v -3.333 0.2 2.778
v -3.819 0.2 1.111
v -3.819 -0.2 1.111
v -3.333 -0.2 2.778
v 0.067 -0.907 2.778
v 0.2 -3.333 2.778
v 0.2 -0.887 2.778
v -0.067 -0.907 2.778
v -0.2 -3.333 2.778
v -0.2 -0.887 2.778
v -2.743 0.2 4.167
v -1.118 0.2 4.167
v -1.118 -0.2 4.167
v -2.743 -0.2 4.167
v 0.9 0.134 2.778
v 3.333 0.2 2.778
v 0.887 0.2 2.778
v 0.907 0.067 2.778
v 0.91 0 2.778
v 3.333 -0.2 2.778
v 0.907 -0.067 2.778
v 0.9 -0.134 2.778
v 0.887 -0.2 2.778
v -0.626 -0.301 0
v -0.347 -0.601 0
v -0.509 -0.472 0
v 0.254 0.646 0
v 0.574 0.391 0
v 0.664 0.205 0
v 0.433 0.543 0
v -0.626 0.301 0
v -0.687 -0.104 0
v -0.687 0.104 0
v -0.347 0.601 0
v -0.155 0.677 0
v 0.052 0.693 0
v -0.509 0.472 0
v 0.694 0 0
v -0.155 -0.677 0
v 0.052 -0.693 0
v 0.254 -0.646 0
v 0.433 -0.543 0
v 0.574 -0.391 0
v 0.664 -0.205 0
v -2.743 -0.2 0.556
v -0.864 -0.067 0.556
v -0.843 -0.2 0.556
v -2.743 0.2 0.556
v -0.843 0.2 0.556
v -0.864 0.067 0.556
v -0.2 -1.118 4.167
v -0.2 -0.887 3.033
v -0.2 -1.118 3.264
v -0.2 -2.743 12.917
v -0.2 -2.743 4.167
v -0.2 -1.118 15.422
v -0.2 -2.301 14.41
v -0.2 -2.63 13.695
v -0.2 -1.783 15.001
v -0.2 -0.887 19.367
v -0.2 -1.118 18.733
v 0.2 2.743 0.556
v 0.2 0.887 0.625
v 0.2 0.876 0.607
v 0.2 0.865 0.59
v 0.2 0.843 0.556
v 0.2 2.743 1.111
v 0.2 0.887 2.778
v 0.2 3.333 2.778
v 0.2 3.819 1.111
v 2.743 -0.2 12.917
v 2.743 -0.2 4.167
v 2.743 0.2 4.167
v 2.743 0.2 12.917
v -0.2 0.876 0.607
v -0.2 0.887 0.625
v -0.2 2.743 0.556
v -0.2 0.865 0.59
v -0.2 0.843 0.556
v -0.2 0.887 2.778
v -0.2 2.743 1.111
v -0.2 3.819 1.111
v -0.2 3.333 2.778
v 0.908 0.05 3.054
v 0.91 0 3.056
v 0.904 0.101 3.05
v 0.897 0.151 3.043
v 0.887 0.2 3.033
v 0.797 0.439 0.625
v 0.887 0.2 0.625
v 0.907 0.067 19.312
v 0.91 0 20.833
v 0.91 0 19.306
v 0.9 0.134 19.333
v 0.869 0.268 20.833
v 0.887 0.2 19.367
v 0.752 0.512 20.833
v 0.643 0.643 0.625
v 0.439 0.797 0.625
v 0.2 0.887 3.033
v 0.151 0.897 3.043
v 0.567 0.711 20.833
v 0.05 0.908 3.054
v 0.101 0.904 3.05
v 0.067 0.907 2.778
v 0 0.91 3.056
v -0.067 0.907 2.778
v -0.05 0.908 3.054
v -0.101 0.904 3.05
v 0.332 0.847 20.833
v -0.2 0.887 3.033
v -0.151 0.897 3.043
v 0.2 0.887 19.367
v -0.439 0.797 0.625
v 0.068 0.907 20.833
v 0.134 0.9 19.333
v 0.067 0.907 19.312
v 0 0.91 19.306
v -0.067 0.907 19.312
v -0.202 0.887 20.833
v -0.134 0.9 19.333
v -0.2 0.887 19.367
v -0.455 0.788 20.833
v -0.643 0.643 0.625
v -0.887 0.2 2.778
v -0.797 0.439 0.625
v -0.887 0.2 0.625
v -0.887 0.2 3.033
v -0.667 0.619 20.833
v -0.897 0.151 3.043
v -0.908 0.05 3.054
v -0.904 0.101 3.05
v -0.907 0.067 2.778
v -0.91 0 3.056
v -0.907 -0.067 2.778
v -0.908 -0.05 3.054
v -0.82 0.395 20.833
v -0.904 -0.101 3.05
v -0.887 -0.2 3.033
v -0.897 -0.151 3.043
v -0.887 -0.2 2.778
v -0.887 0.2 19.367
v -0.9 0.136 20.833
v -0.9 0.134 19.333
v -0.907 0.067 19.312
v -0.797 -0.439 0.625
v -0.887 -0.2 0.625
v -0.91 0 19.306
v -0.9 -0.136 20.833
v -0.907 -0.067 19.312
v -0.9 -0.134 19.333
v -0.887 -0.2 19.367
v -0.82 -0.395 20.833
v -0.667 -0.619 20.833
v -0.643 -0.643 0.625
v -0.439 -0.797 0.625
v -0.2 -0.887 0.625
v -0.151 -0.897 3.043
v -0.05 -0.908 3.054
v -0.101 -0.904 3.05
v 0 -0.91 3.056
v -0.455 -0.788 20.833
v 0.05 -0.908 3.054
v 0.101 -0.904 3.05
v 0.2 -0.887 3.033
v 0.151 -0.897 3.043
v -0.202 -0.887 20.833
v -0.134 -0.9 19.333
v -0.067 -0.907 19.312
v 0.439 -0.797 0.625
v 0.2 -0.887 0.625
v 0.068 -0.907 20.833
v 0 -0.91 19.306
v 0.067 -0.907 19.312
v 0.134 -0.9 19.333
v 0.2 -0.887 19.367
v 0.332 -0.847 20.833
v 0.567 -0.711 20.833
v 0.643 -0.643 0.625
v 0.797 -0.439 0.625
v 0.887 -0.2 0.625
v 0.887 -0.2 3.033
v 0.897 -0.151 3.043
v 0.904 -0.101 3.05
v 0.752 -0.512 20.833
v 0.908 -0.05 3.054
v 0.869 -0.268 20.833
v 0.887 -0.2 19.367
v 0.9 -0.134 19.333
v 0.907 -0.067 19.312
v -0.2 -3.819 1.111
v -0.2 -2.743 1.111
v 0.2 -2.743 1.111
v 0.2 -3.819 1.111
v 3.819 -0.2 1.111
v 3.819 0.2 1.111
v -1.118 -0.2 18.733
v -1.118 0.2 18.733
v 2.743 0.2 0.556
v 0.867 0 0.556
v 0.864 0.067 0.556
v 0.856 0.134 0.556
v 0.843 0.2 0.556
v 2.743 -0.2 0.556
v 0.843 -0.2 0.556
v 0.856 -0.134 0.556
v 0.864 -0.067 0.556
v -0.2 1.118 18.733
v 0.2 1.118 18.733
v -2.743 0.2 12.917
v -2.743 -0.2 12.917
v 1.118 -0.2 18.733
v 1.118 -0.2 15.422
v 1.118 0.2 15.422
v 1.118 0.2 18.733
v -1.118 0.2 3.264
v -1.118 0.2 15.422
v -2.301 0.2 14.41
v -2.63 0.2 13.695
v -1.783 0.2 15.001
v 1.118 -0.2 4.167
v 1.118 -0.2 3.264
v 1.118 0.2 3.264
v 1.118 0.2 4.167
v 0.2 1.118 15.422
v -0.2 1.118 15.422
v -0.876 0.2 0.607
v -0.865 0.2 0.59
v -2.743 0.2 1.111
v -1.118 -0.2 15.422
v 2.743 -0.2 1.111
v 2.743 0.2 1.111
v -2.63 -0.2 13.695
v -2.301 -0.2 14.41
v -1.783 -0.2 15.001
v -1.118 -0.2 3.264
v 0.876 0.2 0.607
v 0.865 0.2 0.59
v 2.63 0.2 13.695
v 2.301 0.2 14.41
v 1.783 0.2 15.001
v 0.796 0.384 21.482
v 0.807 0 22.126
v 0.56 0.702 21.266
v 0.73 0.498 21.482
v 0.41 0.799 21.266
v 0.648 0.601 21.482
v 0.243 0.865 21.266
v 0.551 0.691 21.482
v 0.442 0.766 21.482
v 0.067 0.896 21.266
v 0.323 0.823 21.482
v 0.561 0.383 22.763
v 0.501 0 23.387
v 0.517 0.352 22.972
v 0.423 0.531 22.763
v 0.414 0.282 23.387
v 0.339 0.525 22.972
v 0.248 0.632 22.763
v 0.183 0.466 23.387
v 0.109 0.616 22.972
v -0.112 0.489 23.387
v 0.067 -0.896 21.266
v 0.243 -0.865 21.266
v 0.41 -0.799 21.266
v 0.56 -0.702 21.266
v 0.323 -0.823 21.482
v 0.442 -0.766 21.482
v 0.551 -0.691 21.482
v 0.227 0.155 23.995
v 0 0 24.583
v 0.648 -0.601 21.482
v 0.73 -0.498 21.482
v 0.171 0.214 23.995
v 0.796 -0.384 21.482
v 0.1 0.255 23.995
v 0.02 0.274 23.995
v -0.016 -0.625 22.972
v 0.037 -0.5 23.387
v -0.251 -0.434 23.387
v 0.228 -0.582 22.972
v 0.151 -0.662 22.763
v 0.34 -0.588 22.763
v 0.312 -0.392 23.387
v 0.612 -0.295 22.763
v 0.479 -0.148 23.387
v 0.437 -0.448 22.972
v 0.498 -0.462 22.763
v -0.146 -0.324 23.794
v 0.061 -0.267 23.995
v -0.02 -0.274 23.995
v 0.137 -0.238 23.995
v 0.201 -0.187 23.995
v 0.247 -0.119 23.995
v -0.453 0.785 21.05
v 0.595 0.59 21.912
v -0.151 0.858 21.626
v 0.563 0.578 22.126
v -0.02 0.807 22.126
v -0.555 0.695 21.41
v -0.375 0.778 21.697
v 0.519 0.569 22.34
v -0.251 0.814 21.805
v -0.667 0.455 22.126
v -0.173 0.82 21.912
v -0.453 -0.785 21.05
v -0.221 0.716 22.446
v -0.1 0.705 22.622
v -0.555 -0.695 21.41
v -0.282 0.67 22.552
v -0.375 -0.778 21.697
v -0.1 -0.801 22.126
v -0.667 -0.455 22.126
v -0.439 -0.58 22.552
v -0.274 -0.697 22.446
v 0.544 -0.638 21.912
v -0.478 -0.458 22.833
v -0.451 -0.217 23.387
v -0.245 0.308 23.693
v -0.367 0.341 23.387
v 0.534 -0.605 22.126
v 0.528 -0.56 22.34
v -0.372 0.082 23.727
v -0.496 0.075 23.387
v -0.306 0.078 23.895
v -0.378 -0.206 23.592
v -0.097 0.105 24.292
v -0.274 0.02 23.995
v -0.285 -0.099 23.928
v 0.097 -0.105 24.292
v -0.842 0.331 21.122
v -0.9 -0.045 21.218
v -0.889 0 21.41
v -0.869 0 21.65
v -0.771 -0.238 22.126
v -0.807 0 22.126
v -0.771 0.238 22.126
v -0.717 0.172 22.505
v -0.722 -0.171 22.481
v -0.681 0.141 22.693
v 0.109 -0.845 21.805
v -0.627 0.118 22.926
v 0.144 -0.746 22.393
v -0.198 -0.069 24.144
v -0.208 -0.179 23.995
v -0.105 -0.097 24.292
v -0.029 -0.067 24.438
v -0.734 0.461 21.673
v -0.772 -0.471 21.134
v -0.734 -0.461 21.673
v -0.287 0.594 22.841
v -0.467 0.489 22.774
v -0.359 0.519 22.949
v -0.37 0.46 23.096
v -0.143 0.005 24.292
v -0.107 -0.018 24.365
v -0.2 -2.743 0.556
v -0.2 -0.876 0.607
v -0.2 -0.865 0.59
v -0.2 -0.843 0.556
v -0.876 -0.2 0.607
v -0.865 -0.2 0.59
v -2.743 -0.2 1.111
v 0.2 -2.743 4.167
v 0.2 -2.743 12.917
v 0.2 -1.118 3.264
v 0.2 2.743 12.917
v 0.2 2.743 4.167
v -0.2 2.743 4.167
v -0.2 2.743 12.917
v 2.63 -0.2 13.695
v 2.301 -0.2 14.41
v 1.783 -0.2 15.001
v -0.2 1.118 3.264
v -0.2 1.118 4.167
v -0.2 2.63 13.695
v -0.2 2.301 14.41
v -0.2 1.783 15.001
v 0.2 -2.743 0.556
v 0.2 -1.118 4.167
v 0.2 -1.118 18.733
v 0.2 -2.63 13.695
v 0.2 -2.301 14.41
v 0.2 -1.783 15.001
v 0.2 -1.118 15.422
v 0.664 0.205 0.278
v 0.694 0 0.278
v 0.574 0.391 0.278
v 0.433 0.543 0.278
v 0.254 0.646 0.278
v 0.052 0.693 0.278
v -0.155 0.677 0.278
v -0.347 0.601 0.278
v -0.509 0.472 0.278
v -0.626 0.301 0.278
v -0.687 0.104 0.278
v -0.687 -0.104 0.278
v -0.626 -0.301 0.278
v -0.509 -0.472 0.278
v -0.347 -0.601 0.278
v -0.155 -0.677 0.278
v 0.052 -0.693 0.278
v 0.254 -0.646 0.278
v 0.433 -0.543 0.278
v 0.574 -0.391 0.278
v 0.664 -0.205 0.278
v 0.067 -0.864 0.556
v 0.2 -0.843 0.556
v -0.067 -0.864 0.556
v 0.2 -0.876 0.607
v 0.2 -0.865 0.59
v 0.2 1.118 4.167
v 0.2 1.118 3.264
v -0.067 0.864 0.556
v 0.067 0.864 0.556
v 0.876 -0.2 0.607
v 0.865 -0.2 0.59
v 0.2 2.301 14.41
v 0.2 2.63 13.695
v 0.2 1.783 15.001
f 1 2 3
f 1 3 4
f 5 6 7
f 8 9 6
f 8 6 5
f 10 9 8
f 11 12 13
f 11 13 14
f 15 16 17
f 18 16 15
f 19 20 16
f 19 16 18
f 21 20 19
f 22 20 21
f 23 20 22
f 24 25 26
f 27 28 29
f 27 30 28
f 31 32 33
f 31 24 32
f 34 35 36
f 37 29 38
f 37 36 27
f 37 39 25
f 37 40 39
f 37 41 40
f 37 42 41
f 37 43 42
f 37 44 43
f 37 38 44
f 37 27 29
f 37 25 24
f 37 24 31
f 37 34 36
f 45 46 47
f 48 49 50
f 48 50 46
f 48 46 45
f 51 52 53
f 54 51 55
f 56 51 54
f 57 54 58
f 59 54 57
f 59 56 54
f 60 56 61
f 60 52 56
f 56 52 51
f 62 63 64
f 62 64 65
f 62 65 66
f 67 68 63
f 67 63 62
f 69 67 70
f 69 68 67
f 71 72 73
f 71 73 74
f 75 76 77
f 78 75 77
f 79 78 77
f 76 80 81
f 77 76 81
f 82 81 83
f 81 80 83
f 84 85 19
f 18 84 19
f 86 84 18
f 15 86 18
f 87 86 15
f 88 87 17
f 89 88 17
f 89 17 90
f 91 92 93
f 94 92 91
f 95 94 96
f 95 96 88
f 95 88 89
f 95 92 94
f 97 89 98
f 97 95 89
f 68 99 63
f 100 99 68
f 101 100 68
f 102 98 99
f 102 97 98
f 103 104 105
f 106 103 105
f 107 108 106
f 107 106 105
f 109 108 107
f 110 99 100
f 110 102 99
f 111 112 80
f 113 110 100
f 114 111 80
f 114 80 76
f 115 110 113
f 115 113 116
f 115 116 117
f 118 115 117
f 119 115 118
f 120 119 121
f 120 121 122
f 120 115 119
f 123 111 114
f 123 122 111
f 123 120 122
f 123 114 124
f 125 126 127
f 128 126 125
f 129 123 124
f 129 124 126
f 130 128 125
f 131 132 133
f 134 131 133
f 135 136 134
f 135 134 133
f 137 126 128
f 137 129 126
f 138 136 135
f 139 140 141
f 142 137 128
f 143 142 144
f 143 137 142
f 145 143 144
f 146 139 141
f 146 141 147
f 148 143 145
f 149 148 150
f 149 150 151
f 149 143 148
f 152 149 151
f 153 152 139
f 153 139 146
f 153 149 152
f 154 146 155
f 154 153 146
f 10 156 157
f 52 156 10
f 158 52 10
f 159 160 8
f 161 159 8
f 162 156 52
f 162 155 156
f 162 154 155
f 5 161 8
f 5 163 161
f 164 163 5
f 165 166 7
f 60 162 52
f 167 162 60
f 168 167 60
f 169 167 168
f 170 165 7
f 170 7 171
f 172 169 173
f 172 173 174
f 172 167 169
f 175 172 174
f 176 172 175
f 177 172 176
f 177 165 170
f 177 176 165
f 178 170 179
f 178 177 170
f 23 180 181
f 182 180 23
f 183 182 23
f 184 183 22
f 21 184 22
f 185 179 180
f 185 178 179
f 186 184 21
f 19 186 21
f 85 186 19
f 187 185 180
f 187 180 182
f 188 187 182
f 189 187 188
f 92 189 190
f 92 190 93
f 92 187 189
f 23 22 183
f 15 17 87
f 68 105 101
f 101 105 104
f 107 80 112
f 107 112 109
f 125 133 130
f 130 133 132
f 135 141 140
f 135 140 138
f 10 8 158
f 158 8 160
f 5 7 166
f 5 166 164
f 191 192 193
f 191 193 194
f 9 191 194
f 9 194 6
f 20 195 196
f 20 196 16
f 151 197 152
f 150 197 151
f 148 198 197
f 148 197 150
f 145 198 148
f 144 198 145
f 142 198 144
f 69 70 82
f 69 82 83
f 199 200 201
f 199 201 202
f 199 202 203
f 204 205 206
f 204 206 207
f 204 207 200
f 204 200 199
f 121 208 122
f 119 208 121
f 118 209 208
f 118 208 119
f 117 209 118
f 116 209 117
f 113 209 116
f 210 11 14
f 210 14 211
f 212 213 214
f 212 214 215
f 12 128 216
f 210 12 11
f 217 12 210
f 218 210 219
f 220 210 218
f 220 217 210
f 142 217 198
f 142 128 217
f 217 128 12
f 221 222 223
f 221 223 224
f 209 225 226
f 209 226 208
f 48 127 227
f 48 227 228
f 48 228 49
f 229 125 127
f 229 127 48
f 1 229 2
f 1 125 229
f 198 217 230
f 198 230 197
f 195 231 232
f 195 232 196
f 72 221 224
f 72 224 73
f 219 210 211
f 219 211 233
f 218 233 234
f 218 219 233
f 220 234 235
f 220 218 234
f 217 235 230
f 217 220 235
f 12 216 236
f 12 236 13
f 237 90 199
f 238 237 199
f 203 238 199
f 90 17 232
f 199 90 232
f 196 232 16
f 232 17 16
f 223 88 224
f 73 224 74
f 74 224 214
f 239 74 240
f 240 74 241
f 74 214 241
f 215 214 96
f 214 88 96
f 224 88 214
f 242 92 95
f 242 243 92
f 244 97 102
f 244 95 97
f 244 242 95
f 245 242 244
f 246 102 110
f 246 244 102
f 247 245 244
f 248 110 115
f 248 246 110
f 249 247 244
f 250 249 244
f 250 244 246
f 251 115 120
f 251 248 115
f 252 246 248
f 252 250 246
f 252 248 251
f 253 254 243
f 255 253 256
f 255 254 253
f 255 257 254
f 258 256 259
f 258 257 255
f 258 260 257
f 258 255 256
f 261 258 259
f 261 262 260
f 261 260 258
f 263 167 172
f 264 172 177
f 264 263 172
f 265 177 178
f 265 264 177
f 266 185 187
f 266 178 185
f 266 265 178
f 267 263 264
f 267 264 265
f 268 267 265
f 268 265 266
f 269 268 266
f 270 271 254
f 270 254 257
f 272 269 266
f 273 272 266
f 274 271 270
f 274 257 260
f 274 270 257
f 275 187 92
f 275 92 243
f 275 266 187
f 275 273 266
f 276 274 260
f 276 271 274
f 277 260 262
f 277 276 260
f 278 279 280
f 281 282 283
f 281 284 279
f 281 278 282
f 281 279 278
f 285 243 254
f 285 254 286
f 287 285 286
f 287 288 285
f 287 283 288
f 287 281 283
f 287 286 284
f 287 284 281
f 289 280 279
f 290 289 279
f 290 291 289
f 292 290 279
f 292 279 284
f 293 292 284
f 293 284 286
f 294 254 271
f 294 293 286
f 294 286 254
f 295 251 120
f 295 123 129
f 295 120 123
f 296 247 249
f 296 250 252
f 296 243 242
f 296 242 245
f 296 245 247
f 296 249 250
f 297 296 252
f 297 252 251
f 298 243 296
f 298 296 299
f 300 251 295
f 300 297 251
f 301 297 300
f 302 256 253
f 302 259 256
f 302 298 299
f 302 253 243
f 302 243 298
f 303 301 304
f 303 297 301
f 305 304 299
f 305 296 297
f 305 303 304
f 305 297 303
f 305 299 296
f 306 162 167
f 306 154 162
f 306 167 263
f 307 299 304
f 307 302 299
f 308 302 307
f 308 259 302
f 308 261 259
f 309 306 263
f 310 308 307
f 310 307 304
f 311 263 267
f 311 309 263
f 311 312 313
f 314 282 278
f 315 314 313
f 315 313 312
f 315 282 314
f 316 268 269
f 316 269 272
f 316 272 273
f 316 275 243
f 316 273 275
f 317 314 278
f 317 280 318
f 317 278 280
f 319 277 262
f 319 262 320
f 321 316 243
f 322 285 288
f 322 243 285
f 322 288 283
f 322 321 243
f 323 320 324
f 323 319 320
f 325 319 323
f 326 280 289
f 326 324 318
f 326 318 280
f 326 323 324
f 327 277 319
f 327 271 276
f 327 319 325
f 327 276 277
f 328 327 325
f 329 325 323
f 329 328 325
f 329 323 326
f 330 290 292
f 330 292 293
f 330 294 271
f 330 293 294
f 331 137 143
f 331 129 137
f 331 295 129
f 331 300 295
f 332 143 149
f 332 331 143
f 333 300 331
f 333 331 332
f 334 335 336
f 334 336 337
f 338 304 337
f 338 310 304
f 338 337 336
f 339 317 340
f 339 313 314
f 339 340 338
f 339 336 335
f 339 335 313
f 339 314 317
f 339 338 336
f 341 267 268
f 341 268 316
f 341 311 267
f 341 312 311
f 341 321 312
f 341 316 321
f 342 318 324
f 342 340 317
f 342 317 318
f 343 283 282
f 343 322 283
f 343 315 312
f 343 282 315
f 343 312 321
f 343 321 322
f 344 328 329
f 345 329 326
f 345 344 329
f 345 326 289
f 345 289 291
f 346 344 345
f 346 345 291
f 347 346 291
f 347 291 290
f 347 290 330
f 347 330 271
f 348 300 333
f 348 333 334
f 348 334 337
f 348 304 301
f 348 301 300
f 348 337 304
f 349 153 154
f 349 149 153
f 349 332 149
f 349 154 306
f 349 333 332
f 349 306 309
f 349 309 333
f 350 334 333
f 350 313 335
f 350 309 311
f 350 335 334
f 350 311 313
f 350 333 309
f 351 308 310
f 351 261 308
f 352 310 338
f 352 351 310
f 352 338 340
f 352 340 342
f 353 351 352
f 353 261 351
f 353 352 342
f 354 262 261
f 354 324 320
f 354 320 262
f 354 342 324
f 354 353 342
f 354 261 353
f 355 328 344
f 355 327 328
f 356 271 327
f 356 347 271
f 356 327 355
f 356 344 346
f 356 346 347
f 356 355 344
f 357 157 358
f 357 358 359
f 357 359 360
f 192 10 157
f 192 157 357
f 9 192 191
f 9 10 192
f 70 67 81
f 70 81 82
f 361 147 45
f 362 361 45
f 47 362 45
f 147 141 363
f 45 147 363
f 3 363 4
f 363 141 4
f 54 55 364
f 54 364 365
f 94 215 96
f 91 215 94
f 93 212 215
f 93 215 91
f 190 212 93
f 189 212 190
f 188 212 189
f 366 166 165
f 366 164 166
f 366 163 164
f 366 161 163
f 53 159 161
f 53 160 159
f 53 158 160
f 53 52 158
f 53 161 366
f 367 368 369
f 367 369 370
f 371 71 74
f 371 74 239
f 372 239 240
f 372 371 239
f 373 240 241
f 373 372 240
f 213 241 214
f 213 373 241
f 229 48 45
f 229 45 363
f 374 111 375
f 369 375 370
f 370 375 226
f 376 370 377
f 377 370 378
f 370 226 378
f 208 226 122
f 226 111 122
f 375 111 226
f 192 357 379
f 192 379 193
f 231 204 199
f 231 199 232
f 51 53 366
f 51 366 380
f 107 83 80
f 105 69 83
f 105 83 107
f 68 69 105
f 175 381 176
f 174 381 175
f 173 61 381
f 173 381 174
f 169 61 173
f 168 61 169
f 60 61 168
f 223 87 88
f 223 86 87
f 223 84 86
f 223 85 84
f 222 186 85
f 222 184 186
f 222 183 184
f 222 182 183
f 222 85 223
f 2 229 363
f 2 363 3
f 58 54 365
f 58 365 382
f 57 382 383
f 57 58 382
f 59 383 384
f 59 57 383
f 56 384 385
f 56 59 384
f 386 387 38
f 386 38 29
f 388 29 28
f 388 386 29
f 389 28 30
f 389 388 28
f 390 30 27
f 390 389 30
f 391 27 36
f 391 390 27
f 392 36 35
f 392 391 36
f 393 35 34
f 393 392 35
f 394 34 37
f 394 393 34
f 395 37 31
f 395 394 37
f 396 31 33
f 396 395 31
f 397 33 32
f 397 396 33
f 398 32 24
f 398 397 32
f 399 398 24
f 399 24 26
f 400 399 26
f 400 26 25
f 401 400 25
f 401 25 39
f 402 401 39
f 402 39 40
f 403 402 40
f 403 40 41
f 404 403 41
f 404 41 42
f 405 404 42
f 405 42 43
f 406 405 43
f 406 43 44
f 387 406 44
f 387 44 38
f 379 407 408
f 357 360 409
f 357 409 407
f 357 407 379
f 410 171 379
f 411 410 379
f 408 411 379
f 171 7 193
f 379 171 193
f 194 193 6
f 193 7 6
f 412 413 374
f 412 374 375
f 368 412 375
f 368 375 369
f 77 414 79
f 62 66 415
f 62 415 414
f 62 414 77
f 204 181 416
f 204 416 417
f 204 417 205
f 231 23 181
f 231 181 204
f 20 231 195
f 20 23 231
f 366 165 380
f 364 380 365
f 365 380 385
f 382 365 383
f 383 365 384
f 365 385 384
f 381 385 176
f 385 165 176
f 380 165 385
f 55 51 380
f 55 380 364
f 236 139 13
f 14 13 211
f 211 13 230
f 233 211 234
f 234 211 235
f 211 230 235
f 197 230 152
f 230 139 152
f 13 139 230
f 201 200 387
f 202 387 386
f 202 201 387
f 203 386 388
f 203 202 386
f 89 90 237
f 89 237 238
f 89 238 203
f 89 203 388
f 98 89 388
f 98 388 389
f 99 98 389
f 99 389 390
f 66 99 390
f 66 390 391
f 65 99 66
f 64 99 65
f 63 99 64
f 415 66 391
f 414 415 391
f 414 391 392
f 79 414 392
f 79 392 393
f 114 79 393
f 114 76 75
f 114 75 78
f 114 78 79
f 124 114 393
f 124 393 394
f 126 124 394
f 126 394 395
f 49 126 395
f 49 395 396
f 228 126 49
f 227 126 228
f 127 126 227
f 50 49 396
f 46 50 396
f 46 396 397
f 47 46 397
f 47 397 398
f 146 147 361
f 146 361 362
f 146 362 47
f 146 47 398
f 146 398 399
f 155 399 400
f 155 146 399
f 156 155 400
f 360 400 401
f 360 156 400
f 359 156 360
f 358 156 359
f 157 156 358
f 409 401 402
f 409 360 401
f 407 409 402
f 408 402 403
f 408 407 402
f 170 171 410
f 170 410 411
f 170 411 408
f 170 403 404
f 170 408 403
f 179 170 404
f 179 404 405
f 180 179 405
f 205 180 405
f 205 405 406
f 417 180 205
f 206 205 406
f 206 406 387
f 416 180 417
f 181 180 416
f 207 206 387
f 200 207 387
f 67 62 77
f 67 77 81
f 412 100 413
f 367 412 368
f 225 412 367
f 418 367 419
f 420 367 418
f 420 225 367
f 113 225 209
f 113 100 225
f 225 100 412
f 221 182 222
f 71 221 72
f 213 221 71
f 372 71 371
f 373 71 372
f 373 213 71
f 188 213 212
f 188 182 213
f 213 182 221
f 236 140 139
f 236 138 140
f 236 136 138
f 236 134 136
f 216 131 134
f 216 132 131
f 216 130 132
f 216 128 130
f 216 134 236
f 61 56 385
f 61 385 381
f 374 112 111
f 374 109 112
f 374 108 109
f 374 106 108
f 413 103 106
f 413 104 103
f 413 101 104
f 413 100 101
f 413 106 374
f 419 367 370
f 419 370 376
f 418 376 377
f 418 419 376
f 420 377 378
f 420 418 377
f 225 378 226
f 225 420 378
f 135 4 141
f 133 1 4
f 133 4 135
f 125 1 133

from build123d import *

# Parameters (mm, degrees)
F3_DEPTH = 0.2
F4_COUNT = 4


# Not quite as in the source:
# - a feature names something its author has since deleted; it is built from what else it names


with BuildPart() as f1:
    # F0 (on Front) → F1 (revolve)
    with BuildSketch(Plane.XZ):
        with BuildLine():
            Line((0, 24.5833333333), (0, 0))
            Line((0, 0), (0.6944444444, 0))
            Line((0.6944444444, 0), (0.6944444444, 0.2777777778))
            Line((0.6944444444, 0.2777777778), (0.9097222222, 0.625))
            Line((0.9097222222, 0.625), (0.9097222222, 20.8333333333))
            ThreePointArc((0.9097222222, 20.8333333333), (0.6790405117, 22.7627175953), (0, 24.5833333333))
        make_face()
    revolve(axis=Axis((0, 0, 12.2916666667), (0, 0, 1)))

    # F2 (on Front) → F3 (join, symmetric)
    with BuildSketch(Plane.XZ):
        with BuildLine():
            Line((0, 0.625), (0, 0.5555555556))
            Line((0, 0.5555555556), (2.7430555556, 0.5555555556))
            Line((2.7430555556, 0.5555555556), (2.7430555556, 1.1111111111))
            Line((2.7430555556, 1.1111111111), (3.8194444444, 1.1111111111))
            Line((3.8194444444, 1.1111111111), (3.3333333333, 2.7777777778))
            Line((3.3333333333, 2.7777777778), (0.8, 2.7777777778))
            Line((0.8, 2.7777777778), (0.8, 2.9458333333))
            Line((0.8, 2.9458333333), (1.1180555556, 3.2638888889))
            Line((1.1180555556, 3.2638888889), (1.1180555556, 4.1666666667))
            Line((1.1180555556, 4.1666666667), (2.7430555556, 4.1666666667))
            Line((2.7430555556, 4.1666666667), (2.7430555556, 12.9166666667))
            ThreePointArc((2.7430555556, 12.9166666667), (2.3012216629, 14.4095607148), (1.1180555556, 15.4215230609))
            Line((1.1180555556, 15.4215230609), (1.1180555556, 18.7331644265))
            Line((1.1180555556, 18.7331644265), (0, 21.8049968191))
            Line((0, 21.8049968191), (0, 0.625))
        make_face()
    extrude(amount=F3_DEPTH, both=True)

    # F4: F1 ×4 about axis
    f4_axis = Axis((0, 0, 0.625), (0, 0, 1))


with BuildPart() as f1_1:
    add(f1.part)
    for i in range(1, F4_COUNT):
        add(f1.part.rotate(f4_axis, i * 360 / F4_COUNT))


solid = f1_1.part
